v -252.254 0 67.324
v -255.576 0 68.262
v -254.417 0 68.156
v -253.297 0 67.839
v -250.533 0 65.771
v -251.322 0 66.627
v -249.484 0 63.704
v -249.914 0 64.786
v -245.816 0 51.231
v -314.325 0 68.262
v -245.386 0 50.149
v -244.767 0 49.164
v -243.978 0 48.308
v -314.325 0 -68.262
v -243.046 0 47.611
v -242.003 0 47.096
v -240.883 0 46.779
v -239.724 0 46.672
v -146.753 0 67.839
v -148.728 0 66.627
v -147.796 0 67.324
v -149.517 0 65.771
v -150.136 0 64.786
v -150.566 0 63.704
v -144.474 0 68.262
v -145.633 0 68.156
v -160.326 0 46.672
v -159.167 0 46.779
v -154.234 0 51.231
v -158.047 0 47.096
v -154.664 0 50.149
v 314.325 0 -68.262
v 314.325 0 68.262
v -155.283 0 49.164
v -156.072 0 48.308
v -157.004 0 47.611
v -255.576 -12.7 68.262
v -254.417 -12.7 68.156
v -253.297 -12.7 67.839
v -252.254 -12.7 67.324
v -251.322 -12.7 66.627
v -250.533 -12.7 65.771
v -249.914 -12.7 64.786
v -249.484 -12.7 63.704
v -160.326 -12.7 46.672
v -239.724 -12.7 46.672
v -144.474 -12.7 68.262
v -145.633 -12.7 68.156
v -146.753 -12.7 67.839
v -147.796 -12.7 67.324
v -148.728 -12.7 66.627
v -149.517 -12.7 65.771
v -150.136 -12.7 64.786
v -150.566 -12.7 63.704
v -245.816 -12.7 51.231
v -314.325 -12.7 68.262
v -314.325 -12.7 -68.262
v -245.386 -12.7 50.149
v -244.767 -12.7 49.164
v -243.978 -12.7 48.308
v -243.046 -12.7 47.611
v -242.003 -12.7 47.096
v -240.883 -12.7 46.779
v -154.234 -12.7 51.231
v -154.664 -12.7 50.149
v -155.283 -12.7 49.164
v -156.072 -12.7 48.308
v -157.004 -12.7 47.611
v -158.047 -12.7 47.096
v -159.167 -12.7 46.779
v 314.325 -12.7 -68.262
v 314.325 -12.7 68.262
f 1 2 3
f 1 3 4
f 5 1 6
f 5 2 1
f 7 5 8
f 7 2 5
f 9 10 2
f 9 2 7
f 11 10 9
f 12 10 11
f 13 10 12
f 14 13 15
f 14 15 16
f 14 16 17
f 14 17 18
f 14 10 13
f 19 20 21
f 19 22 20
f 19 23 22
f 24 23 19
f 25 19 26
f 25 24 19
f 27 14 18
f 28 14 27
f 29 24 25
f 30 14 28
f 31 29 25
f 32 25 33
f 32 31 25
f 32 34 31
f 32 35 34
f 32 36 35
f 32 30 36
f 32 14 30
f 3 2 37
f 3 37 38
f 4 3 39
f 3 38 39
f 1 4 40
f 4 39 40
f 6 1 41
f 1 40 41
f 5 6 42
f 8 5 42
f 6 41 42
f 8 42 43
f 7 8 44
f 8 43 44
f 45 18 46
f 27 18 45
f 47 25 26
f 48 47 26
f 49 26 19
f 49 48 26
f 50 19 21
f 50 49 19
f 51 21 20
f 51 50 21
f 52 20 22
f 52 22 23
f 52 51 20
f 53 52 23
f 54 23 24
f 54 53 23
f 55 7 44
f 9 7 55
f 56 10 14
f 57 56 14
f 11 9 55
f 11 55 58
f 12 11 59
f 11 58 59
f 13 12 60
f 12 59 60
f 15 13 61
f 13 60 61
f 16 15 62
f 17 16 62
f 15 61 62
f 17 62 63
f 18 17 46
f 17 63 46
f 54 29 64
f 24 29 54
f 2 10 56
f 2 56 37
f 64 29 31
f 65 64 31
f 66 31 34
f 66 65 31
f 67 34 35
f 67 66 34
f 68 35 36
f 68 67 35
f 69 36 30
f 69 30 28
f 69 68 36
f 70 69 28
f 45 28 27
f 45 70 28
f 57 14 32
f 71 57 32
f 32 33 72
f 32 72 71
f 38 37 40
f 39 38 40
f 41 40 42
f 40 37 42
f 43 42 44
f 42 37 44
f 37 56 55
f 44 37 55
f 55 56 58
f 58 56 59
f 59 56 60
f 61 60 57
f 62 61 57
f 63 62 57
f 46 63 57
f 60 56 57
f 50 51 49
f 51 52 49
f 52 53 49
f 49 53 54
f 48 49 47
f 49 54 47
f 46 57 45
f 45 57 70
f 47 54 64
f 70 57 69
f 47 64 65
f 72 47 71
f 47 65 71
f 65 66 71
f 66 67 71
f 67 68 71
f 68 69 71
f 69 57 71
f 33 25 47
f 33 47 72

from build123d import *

# Parameters (mm, degrees)
SKETCH1_W           = 628.65
SKETCH1_H           = 136.525
BOSS_EXTRUDE1_DEPTH = 12.7
CUT_EXTRUDE1_DEPTH  = 322.902569936
FILLET1_R           = 6.35


with BuildPart() as part:
    # Sketch1 → Boss-Extrude1 (new body)
    with BuildSketch(Plane(origin=(0, 0, 0), x_dir=(1, 0, 0), z_dir=(0, 1, 0))):
        Rectangle(SKETCH1_W, SKETCH1_H)
    extrude(amount=-BOSS_EXTRUDE1_DEPTH)

    # Sketch2 → Cut-Extrude1 (cut, through all)
    with BuildSketch(Plane(origin=(0, 0, 0), x_dir=(1, 0, 0), z_dir=(0, 1, 0))):
        Polygon((-250.825, -68.2625), (-244.475, -46.6725), (-155.575, -46.6725), (-149.225, -68.2625), align=None)
    extrude(amount=-CUT_EXTRUDE1_DEPTH, mode=Mode.SUBTRACT)

    # Fillet1
    fillet1_edges = [part.edges().sort_by_distance(p)[0] for p in [
        (-149.225, -6.35, 68.2625),
        (-250.825, -6.35, 68.2625),
        (-244.475, -6.35, 46.6725),
        (-155.575, -6.35, 46.6725),
    ]]
    fillet(fillet1_edges, radius=FILLET1_R)


solid = part.part
